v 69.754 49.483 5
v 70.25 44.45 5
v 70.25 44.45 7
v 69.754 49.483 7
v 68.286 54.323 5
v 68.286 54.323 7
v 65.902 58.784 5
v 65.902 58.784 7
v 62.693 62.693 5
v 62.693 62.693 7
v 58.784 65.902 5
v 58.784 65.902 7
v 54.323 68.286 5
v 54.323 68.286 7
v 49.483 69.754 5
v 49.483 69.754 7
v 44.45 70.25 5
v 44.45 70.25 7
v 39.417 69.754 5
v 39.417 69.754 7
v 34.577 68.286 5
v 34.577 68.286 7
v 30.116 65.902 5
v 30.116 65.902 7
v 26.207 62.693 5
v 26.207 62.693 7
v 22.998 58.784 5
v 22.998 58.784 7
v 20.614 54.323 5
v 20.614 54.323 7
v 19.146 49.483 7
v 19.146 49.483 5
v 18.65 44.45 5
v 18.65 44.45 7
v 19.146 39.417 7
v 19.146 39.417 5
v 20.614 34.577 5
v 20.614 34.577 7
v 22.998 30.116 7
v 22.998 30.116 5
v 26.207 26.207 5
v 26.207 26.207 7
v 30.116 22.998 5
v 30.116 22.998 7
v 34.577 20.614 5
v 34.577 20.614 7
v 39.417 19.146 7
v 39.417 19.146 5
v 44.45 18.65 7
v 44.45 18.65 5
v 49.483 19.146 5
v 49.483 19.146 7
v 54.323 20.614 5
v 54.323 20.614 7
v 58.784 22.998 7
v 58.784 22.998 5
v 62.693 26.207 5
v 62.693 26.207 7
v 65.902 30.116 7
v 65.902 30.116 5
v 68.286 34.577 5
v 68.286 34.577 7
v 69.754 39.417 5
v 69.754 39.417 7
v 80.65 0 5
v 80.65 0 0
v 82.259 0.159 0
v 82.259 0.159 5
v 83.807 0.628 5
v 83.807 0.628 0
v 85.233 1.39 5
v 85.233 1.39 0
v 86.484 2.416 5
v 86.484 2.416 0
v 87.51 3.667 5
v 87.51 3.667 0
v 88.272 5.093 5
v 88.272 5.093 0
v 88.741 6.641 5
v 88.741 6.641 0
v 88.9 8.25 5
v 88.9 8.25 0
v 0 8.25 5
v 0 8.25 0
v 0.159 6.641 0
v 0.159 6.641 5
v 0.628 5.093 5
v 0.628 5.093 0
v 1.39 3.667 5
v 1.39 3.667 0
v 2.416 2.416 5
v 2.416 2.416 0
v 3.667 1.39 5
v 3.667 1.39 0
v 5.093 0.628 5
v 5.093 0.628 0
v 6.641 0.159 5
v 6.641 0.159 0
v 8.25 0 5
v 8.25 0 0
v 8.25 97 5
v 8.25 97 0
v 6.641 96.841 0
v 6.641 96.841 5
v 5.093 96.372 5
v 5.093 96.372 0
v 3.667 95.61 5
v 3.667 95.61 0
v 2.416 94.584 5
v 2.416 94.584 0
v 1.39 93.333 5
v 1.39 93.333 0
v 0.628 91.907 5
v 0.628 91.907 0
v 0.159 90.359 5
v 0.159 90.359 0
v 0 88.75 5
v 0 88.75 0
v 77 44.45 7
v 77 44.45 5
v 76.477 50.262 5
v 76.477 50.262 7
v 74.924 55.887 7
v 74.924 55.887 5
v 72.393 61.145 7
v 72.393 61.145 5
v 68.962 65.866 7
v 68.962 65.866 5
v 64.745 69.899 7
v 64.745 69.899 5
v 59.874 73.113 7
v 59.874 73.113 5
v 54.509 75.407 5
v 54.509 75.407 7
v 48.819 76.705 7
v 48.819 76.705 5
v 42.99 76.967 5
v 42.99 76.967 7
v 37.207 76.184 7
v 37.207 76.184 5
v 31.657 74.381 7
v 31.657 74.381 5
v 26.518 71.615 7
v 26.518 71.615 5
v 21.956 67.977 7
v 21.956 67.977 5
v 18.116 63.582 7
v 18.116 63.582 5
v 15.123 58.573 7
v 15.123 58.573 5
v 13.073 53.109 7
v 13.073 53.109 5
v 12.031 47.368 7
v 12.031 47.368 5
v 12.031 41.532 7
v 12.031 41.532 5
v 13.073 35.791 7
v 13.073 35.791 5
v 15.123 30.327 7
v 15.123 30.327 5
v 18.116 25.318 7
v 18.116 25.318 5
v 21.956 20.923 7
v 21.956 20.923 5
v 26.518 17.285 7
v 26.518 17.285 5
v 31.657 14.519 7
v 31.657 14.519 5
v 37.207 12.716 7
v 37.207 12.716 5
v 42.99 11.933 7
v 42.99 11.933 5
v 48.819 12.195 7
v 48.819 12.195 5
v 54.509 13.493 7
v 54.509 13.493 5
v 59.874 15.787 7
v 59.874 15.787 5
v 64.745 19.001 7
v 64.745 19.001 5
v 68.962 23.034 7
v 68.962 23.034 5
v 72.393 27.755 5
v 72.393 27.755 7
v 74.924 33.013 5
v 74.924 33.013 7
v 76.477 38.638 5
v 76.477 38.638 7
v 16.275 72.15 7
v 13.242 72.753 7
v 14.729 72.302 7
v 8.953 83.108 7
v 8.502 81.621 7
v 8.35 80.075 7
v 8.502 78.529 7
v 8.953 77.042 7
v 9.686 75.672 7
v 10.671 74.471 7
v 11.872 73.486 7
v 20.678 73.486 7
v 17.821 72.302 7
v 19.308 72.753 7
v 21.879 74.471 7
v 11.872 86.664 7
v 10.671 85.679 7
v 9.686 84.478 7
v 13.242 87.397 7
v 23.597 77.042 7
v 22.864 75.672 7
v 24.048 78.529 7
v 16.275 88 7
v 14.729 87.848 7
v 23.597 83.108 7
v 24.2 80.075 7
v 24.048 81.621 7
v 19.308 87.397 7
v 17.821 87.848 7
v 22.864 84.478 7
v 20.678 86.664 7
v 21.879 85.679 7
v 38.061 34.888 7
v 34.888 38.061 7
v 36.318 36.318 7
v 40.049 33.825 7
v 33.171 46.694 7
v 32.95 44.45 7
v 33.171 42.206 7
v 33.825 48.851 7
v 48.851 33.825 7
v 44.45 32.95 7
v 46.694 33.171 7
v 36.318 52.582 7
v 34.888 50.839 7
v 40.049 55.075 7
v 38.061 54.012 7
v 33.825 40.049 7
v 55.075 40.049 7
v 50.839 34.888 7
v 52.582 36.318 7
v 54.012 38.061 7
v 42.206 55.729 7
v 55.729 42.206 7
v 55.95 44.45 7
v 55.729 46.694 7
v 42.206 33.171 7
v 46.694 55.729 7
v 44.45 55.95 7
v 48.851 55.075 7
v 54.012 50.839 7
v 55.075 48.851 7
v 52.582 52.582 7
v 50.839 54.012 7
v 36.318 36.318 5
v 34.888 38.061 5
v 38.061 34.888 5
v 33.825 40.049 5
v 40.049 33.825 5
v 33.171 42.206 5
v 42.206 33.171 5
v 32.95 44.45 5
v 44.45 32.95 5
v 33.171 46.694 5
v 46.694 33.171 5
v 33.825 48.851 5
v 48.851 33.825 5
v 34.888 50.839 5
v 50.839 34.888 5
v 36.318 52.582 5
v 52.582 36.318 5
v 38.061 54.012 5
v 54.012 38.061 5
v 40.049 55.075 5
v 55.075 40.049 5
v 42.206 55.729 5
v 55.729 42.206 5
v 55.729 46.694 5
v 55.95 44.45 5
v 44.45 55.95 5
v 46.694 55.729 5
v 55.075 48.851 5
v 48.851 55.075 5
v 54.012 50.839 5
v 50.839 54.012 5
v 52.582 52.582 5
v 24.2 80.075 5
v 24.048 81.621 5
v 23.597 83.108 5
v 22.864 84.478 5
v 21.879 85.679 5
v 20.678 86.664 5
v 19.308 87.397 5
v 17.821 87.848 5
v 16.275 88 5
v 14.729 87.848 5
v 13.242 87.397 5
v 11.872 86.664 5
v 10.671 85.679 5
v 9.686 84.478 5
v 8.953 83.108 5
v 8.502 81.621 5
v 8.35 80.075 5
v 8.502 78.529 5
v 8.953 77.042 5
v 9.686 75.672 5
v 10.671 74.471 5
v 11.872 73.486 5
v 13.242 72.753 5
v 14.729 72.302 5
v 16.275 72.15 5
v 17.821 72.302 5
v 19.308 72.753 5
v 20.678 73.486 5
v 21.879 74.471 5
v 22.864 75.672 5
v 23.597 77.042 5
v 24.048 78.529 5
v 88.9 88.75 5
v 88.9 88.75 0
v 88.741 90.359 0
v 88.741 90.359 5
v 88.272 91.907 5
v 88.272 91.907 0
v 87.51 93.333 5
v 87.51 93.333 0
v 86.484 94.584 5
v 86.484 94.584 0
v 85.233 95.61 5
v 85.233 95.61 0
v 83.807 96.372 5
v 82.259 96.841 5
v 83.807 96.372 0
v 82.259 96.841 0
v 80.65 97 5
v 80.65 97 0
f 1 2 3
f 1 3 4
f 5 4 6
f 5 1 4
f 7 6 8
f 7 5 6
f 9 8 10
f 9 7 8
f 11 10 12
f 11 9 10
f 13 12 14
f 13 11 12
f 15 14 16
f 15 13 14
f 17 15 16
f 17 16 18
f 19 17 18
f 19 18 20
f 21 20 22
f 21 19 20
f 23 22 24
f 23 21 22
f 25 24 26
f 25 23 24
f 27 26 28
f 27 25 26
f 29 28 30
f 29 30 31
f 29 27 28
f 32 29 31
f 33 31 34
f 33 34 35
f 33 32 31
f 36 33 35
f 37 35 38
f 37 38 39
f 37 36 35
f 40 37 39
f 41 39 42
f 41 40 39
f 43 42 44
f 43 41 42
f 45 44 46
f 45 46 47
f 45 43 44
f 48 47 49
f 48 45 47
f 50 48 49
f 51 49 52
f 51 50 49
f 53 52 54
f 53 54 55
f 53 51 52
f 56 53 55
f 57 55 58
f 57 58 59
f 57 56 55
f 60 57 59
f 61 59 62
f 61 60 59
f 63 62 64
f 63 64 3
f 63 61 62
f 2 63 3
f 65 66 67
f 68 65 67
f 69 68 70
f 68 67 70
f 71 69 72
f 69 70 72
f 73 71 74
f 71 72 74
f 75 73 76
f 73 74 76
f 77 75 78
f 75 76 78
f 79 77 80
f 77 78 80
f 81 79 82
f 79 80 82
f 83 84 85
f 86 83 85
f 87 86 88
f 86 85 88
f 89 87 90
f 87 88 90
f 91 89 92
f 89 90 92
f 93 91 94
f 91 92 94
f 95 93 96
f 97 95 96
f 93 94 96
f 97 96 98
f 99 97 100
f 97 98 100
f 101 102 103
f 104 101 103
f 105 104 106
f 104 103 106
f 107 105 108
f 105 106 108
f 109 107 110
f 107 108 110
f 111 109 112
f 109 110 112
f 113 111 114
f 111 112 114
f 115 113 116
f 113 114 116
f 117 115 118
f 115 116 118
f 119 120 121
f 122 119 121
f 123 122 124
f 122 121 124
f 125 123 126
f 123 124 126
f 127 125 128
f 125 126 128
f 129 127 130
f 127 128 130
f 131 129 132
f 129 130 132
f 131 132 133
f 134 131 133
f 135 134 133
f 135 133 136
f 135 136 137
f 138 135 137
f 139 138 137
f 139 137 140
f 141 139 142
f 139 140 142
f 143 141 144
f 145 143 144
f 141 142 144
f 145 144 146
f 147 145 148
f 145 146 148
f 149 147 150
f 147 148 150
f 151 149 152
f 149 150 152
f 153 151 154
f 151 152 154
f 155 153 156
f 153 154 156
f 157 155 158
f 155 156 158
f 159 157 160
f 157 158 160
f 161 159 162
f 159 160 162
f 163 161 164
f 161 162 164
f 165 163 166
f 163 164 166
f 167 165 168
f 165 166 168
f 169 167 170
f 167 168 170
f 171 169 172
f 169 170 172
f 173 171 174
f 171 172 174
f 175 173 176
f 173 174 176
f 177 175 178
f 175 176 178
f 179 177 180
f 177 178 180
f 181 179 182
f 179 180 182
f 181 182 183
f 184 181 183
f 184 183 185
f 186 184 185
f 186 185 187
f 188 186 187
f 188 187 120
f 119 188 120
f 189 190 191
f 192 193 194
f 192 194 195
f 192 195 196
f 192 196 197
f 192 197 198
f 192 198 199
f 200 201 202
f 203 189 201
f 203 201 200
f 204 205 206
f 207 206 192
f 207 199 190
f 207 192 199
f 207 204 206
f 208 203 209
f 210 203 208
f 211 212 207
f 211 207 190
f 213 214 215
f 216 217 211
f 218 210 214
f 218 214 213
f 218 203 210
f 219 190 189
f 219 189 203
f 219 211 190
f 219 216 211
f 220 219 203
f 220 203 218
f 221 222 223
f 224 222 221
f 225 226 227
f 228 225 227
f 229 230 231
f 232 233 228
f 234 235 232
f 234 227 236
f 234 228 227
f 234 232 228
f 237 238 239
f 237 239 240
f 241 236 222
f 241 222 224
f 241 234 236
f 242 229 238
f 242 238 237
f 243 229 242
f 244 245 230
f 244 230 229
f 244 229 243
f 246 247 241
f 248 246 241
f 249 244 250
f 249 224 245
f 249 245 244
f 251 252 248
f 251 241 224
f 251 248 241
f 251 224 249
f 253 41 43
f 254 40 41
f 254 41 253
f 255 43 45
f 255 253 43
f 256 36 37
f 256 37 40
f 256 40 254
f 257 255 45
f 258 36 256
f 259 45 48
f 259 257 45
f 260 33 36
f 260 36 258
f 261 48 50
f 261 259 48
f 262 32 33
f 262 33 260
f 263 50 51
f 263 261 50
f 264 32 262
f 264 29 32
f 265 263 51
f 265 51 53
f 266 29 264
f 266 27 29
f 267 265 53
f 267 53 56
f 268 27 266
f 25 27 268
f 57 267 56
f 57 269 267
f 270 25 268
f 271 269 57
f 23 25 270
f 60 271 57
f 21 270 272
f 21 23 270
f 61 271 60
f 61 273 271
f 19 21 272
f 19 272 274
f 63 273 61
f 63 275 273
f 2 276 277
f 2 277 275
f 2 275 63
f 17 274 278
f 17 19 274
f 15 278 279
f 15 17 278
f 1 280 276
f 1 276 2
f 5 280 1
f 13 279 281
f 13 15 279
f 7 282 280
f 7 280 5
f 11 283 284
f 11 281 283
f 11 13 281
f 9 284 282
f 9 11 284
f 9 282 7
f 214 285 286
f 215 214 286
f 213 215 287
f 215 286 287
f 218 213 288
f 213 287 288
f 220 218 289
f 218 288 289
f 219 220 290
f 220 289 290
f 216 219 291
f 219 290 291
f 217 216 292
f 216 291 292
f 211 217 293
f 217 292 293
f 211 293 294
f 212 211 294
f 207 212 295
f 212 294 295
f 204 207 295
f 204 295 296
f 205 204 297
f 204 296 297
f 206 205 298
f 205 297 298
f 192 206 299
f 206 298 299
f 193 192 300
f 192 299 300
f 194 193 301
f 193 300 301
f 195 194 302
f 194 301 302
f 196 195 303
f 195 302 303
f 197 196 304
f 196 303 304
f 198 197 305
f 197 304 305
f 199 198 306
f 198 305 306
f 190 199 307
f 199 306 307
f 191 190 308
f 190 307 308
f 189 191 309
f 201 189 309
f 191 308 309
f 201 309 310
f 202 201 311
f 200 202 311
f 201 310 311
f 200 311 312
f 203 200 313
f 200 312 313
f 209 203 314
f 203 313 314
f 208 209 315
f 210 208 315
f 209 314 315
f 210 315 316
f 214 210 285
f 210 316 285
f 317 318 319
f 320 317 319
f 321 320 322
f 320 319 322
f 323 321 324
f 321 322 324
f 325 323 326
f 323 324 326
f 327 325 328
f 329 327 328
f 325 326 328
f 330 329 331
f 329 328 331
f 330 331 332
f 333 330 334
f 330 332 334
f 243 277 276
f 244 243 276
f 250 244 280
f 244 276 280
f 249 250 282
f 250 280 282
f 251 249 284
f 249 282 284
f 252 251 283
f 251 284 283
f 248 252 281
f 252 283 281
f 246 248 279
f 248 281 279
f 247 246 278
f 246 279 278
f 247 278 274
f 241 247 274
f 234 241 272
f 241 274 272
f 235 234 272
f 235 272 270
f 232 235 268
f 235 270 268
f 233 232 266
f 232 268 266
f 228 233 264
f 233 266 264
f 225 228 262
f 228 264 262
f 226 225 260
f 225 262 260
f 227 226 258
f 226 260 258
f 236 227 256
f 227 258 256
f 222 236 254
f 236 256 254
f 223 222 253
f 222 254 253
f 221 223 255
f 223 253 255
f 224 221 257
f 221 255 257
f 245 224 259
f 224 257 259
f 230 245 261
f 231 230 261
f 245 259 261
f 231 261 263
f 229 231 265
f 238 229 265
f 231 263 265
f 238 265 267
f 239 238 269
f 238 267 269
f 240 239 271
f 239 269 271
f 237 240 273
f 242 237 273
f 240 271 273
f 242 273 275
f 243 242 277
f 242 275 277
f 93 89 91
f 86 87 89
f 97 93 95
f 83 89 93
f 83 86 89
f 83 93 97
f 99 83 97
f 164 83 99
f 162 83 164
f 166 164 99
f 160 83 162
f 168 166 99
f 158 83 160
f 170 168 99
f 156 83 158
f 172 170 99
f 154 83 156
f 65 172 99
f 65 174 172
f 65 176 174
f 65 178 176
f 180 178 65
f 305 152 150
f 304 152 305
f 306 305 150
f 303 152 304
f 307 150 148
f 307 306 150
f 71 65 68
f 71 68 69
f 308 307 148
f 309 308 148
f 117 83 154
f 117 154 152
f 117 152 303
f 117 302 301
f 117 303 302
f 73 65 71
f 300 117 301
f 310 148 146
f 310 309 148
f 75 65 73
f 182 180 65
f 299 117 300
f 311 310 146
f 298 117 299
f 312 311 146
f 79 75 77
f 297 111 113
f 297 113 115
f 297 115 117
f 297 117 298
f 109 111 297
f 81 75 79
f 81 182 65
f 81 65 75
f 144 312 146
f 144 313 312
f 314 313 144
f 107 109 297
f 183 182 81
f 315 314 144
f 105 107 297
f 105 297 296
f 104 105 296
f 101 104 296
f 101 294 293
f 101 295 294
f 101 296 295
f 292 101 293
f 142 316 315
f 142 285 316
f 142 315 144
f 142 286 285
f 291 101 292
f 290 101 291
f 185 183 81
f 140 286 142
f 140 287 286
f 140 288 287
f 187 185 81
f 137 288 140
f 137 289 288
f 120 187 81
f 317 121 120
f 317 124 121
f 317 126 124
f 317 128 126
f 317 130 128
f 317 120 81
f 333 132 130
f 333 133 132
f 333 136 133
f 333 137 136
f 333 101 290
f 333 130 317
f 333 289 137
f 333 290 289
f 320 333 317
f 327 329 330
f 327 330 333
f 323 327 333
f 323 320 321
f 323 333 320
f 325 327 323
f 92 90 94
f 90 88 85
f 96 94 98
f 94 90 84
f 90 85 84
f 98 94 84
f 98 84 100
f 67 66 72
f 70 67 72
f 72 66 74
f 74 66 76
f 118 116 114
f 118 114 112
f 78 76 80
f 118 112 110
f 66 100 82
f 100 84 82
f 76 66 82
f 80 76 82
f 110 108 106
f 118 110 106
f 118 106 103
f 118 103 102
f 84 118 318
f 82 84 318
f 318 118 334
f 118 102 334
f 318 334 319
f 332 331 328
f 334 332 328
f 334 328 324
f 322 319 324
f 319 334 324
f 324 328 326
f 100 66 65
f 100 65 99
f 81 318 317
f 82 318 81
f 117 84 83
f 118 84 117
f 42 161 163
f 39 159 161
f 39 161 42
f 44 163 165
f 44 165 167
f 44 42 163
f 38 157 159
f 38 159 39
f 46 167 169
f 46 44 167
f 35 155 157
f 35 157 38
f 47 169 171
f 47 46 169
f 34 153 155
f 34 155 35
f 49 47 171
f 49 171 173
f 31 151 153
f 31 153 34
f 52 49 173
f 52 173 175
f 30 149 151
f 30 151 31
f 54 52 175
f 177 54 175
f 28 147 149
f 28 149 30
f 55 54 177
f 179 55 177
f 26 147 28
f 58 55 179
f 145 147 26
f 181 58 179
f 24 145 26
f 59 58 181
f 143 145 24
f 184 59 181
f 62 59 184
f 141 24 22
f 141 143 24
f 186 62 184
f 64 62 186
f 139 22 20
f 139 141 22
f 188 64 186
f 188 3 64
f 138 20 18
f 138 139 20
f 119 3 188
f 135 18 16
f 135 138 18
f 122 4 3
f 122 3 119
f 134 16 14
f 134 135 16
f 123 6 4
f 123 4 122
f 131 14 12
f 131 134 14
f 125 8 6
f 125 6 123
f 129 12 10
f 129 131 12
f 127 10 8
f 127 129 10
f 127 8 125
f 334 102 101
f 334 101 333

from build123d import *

# Parameters (mm, degrees)
PAD_DEPTH     = 5
SKETCH001_R   = 7.925
SKETCH001_R_2 = 32.55
SKETCH001_R_3 = 25.8
SKETCH001_R_4 = 11.5
PAD001_DEPTH  = 2


with BuildPart() as part:
    # Sketch → Pad (new body)
    with BuildSketch(Plane.XY):
        with BuildLine():
            ThreePointArc((0, 8.25), (2.416369, 2.416369), (8.25, 0))
            Line((80.65, 0), (8.25, 0))
            ThreePointArc((80.65, 0), (86.483631, 2.416369), (88.9, 8.25))
            Line((88.9, 88.75), (88.9, 8.25))
            ThreePointArc((88.9, 88.75), (86.483631, 94.583631), (80.65, 97))
            Line((8.25, 97), (80.65, 97))
            ThreePointArc((8.25, 97), (2.416369, 94.583631), (0, 88.75))
            Line((0, 8.25), (0, 88.75))
        make_face()
    extrude(amount=PAD_DEPTH)

    # Sketch001 (on Face10 of Pad) → Pad001 (join)
    with BuildSketch(Plane.XY.offset(5)):
        with Locations((16.275, 80.075)):
            Circle(SKETCH001_R)
        with Locations((44.45, 44.45)):
            Circle(SKETCH001_R_2)
        with Locations((44.45, 44.45)):
            Circle(SKETCH001_R_3, mode=Mode.SUBTRACT)
        with Locations((44.45, 44.45)):
            Circle(SKETCH001_R_4)
    extrude(amount=PAD001_DEPTH)


solid = part.part
